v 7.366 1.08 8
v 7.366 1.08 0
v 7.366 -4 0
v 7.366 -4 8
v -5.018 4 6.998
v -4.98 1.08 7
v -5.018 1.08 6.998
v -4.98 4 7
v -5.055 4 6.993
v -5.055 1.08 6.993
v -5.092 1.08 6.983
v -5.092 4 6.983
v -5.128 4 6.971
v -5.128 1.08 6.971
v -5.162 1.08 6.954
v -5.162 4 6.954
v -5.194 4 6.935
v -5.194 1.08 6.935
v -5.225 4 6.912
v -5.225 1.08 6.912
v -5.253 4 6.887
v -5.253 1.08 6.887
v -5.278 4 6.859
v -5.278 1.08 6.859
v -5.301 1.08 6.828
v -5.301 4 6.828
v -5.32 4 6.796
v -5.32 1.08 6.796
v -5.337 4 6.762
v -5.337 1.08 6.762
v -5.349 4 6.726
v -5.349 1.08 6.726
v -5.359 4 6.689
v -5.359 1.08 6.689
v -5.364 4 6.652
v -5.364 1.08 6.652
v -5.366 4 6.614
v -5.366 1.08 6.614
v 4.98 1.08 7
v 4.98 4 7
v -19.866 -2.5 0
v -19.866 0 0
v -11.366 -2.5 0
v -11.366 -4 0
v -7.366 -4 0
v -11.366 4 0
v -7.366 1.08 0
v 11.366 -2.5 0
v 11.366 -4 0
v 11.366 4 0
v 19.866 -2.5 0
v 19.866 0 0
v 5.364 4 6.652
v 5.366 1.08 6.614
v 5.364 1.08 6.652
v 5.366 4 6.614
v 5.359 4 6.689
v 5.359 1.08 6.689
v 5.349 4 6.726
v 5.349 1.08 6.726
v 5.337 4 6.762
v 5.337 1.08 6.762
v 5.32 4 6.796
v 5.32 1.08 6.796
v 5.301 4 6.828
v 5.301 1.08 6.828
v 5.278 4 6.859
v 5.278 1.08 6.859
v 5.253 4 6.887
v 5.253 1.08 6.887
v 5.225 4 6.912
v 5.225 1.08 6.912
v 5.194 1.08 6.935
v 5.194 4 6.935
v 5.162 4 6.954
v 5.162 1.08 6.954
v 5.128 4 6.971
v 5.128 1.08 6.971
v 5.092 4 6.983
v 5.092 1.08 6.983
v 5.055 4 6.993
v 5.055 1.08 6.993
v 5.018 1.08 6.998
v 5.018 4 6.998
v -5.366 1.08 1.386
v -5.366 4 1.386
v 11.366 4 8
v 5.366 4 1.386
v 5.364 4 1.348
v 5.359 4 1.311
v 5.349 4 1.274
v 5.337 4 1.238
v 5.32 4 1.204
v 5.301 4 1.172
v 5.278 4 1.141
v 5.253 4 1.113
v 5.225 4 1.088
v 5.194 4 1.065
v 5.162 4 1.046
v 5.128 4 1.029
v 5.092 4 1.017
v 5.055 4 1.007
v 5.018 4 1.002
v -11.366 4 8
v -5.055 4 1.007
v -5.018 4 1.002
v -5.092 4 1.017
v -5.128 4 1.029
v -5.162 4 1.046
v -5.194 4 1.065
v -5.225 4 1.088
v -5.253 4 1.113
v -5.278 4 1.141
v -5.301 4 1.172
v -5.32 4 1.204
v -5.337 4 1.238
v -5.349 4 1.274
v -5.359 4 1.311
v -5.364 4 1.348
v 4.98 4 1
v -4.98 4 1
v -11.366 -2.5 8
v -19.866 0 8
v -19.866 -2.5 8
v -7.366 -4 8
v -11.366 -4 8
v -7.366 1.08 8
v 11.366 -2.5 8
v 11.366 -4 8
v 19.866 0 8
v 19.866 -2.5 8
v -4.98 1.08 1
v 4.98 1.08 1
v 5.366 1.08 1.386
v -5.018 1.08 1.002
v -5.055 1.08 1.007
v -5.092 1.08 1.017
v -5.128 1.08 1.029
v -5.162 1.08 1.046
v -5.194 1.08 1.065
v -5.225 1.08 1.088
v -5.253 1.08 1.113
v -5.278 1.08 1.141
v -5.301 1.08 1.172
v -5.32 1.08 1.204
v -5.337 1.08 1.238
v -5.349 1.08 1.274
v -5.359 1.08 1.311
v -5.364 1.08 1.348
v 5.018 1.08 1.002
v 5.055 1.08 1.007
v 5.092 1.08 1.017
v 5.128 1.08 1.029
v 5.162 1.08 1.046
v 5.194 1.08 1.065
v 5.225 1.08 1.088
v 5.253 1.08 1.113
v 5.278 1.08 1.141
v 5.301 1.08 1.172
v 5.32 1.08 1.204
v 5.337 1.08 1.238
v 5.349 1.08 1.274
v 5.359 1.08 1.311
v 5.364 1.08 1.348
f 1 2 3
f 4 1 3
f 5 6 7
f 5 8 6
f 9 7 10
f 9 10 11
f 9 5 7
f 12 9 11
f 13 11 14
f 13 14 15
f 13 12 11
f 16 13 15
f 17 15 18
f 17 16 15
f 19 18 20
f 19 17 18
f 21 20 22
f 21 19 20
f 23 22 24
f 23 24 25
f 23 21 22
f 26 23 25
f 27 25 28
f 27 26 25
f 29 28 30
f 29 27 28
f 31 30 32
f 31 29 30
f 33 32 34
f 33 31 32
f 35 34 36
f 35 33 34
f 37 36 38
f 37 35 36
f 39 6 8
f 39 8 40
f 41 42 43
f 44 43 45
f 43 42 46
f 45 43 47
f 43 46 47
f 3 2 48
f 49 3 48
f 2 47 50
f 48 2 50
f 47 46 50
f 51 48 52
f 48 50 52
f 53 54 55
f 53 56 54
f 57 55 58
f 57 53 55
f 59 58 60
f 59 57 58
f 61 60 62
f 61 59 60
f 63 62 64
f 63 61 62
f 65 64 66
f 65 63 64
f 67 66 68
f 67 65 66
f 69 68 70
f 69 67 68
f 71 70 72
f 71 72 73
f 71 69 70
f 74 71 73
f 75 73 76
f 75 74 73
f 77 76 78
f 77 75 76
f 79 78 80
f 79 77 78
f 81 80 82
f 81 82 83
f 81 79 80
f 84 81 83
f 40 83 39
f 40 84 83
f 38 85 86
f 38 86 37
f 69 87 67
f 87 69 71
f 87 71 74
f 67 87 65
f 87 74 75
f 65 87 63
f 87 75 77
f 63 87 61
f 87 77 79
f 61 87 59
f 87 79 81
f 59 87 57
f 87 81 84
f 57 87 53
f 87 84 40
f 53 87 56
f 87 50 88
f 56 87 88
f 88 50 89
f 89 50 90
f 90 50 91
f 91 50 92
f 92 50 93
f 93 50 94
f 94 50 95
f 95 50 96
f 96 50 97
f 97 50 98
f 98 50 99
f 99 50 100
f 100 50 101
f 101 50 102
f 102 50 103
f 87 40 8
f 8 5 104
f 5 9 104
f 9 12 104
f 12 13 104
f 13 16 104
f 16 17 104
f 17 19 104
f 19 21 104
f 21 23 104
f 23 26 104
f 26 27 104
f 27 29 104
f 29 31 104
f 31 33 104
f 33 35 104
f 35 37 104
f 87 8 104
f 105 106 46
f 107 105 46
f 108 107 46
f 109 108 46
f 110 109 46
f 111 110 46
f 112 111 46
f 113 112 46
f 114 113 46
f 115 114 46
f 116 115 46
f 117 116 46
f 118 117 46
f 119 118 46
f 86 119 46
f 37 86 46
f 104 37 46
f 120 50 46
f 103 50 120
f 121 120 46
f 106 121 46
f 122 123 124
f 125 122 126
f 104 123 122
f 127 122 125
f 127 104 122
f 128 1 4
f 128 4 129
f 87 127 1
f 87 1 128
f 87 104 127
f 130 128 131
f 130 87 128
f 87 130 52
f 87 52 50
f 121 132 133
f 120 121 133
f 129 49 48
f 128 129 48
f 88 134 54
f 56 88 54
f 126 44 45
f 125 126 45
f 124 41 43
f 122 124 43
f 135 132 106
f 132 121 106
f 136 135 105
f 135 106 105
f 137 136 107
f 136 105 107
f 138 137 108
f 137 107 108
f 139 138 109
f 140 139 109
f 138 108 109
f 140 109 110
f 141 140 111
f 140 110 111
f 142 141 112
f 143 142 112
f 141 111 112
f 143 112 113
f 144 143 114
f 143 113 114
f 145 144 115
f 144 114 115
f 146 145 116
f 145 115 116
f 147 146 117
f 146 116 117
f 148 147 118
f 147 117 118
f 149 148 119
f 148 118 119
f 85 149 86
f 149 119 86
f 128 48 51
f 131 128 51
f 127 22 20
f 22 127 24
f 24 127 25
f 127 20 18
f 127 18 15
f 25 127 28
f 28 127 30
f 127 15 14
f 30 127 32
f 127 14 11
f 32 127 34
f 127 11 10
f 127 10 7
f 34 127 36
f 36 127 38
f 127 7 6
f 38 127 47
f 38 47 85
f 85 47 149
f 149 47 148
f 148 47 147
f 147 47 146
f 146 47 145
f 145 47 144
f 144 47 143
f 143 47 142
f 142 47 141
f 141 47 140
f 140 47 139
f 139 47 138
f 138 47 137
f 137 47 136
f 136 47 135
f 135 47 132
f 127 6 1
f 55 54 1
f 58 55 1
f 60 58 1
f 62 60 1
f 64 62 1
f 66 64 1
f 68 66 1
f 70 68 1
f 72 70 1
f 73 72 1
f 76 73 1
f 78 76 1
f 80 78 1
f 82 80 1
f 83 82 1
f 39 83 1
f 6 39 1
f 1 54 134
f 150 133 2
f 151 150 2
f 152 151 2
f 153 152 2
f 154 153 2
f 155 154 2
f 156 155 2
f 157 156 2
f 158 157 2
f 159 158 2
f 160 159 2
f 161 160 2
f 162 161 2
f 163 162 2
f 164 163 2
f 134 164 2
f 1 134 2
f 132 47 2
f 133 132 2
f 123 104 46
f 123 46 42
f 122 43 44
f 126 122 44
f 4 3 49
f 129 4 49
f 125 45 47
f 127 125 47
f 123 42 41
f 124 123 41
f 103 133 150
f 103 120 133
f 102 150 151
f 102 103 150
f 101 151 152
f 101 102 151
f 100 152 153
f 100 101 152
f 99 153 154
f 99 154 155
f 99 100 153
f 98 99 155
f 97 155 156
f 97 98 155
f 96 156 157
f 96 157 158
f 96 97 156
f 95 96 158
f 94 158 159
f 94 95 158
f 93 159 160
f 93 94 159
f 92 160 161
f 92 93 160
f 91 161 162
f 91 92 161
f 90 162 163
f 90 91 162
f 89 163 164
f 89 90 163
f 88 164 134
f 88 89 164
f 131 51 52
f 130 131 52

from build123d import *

# Parameters (mm, degrees)
F1_DEPTH = 8
F2_W     = 10.732
F2_H     = 6
F3_DEPTH = 25
F4_R     = 0.386274
F6_DEPTH = 8


with BuildPart() as f1:
    # F0 (on Top) → F1 (new body)
    with BuildSketch(Plane.XY):
        Polygon((11.366, 4), (-11.366, 4), (-11.366, 0), (-19.866, 0), (-19.866, -2.5), (-11.366, -2.5), (-11.366, -4), (-7.366, -4), (-7.366, 1.08), (7.366, 1.08), (7.366, -4), (11.366, -4), (11.366, -2.5), (19.866, -2.5), (19.866, 0), (11.366, 0), align=None)
    extrude(amount=F1_DEPTH)

    # F2 (on face) → F3 (cut)
    with BuildSketch(Plane.XZ.offset(-1.08)):
        with Locations((0, 4)):
            Rectangle(F2_W, F2_H)
    extrude(amount=-F3_DEPTH, mode=Mode.SUBTRACT)

    # F4
    f4_edges = [f1.edges().sort_by_distance(p)[0] for p in [
        (-5.366, 2.54, 1),
        (-5.366, 2.54, 7),
        (5.366, 2.54, 7),
        (5.366, 2.54, 1),
    ]]
    fillet(f4_edges, radius=F4_R)

    # F5 (on face) → F6 (join)
    with BuildSketch(Plane.XY.offset(8)):
        Polygon((19.866, 0), (11.366, 4), (11.366, 0), align=None)
        Polygon((-11.366, 0), (-11.366, 4), (-19.866, 0), align=None)
    extrude(amount=-F6_DEPTH)


solid = f1.part
